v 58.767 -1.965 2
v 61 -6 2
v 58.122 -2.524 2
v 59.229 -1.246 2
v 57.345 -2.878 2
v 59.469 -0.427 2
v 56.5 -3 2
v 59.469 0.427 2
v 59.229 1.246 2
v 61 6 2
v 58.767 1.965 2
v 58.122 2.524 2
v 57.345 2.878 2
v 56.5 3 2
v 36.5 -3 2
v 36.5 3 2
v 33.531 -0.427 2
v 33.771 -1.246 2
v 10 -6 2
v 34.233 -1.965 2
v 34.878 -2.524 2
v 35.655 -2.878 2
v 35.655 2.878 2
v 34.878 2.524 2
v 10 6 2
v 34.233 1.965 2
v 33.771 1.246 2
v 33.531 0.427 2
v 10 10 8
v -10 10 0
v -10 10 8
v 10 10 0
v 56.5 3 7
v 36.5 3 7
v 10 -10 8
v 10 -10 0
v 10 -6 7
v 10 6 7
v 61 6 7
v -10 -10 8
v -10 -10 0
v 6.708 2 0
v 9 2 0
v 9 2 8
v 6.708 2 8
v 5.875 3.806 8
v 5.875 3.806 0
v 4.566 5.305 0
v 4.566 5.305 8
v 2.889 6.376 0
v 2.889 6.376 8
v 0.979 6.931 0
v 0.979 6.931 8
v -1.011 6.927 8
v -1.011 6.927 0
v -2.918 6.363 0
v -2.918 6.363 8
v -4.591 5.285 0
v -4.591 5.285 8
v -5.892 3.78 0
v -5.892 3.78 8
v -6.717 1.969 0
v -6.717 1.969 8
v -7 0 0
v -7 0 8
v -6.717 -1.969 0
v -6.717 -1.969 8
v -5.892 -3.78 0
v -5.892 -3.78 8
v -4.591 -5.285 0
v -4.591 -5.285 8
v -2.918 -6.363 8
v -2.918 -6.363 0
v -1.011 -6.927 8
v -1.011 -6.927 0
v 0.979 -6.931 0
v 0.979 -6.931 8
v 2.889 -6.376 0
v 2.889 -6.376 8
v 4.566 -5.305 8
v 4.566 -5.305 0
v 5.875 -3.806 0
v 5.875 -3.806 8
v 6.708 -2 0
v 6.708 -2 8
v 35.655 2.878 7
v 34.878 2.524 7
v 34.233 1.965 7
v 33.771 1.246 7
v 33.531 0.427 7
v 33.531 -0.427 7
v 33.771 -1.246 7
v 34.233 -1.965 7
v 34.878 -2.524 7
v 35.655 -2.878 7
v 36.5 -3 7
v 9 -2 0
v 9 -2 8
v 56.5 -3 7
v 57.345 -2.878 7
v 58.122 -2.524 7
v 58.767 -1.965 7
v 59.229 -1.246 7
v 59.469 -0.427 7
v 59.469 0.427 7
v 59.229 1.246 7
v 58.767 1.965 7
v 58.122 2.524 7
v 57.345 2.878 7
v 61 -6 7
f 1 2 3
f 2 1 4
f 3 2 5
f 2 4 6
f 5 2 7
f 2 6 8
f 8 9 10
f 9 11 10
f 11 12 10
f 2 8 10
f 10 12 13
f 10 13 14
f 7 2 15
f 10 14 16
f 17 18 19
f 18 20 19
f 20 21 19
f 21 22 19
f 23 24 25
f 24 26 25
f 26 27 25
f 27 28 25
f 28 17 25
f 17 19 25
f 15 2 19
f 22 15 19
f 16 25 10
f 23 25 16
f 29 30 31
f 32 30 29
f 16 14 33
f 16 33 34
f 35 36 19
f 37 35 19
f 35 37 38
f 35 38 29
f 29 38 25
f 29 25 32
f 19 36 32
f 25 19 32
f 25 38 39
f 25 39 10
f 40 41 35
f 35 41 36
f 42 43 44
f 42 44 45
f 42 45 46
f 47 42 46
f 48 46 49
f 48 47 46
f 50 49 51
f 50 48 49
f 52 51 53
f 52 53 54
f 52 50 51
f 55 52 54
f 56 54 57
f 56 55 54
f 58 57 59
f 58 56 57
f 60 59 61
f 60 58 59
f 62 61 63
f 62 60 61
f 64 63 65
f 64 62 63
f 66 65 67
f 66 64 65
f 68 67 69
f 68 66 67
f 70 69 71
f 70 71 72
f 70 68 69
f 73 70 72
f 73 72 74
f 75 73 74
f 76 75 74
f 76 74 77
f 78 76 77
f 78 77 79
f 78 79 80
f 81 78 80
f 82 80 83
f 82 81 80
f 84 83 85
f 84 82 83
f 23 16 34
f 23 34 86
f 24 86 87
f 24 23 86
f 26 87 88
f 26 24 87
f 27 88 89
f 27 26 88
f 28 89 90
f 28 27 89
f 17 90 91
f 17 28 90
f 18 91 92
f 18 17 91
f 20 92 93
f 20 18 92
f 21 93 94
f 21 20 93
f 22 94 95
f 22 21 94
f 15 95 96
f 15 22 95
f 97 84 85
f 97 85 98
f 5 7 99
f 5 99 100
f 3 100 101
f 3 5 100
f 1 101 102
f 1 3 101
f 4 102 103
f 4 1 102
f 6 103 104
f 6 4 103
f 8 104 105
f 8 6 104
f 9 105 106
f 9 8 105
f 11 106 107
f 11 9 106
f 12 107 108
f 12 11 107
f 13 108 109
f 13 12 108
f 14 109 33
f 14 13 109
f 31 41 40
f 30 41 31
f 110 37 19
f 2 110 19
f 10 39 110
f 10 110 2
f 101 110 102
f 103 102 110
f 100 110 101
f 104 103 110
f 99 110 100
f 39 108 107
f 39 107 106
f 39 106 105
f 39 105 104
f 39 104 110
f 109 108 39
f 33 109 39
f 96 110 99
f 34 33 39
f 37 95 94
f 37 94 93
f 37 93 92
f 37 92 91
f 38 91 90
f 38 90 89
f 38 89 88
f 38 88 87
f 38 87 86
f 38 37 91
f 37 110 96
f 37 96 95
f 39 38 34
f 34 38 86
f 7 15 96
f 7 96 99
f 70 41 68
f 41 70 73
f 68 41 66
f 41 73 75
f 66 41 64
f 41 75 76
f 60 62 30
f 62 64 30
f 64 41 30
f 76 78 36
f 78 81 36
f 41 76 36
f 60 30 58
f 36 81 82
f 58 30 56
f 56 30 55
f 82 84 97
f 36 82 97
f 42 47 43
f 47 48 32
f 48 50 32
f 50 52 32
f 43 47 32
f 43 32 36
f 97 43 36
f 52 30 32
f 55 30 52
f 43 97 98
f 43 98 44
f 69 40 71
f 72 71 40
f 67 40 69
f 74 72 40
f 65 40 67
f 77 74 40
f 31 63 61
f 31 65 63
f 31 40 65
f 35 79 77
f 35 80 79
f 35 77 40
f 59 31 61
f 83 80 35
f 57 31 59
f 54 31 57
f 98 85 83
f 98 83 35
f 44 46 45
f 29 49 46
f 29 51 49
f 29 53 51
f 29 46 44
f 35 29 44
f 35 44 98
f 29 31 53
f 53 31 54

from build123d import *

# Parameters (mm, degrees)
SKETCH_1_W          = 20
SKETCH_1_H          = 20
EXTRUDE_2_DEPTH     = 8
SKETCH_2_W          = 5
SKETCH_2_H          = 12
EXTRUDE_3_DEPTH     = 51
CUT_EXTRUDE_1_DEPTH = 63.104750221


with BuildPart() as part:
    # 草图1 → 凸台-拉伸2 (new body)
    with BuildSketch(Plane.XY):
        Rectangle(SKETCH_1_W, SKETCH_1_H)
        with BuildLine():
            Line((6.708203932, -2), (9, -2))
            Line((9, -2), (9, 2))
            Line((9, 2), (6.708203932, 2))
            ThreePointArc((6.708203932, 2), (-7, 0), (6.708203932, -2))
        make_face(mode=Mode.SUBTRACT)
    extrude(amount=EXTRUDE_2_DEPTH)

    # 草图2 → 凸台-拉伸3 (add)
    with BuildSketch(Plane(origin=(10, 0, 0), x_dir=(0, 0, -1), z_dir=(1, 0, 0))):
        with Locations((-4.5, 0)):
            Rectangle(SKETCH_2_W, SKETCH_2_H)
    extrude(amount=EXTRUDE_3_DEPTH)

    # 草图3 → 切除-拉伸1 (cut, through all)
    with BuildSketch(Plane(origin=(0, 0, 2), x_dir=(-1, 0, 0), z_dir=(0, 0, -1))):
        with BuildLine():
            Line((-56.5, 3), (-36.5, 3))
            ThreePointArc((-36.5, 3), (-33.5, 0), (-36.5, -3))
            Line((-36.5, -3), (-56.5, -3))
            ThreePointArc((-56.5, -3), (-59.5, 0), (-56.5, 3))
        make_face()
    extrude(amount=-CUT_EXTRUDE_1_DEPTH, mode=Mode.SUBTRACT)


solid = part.part
